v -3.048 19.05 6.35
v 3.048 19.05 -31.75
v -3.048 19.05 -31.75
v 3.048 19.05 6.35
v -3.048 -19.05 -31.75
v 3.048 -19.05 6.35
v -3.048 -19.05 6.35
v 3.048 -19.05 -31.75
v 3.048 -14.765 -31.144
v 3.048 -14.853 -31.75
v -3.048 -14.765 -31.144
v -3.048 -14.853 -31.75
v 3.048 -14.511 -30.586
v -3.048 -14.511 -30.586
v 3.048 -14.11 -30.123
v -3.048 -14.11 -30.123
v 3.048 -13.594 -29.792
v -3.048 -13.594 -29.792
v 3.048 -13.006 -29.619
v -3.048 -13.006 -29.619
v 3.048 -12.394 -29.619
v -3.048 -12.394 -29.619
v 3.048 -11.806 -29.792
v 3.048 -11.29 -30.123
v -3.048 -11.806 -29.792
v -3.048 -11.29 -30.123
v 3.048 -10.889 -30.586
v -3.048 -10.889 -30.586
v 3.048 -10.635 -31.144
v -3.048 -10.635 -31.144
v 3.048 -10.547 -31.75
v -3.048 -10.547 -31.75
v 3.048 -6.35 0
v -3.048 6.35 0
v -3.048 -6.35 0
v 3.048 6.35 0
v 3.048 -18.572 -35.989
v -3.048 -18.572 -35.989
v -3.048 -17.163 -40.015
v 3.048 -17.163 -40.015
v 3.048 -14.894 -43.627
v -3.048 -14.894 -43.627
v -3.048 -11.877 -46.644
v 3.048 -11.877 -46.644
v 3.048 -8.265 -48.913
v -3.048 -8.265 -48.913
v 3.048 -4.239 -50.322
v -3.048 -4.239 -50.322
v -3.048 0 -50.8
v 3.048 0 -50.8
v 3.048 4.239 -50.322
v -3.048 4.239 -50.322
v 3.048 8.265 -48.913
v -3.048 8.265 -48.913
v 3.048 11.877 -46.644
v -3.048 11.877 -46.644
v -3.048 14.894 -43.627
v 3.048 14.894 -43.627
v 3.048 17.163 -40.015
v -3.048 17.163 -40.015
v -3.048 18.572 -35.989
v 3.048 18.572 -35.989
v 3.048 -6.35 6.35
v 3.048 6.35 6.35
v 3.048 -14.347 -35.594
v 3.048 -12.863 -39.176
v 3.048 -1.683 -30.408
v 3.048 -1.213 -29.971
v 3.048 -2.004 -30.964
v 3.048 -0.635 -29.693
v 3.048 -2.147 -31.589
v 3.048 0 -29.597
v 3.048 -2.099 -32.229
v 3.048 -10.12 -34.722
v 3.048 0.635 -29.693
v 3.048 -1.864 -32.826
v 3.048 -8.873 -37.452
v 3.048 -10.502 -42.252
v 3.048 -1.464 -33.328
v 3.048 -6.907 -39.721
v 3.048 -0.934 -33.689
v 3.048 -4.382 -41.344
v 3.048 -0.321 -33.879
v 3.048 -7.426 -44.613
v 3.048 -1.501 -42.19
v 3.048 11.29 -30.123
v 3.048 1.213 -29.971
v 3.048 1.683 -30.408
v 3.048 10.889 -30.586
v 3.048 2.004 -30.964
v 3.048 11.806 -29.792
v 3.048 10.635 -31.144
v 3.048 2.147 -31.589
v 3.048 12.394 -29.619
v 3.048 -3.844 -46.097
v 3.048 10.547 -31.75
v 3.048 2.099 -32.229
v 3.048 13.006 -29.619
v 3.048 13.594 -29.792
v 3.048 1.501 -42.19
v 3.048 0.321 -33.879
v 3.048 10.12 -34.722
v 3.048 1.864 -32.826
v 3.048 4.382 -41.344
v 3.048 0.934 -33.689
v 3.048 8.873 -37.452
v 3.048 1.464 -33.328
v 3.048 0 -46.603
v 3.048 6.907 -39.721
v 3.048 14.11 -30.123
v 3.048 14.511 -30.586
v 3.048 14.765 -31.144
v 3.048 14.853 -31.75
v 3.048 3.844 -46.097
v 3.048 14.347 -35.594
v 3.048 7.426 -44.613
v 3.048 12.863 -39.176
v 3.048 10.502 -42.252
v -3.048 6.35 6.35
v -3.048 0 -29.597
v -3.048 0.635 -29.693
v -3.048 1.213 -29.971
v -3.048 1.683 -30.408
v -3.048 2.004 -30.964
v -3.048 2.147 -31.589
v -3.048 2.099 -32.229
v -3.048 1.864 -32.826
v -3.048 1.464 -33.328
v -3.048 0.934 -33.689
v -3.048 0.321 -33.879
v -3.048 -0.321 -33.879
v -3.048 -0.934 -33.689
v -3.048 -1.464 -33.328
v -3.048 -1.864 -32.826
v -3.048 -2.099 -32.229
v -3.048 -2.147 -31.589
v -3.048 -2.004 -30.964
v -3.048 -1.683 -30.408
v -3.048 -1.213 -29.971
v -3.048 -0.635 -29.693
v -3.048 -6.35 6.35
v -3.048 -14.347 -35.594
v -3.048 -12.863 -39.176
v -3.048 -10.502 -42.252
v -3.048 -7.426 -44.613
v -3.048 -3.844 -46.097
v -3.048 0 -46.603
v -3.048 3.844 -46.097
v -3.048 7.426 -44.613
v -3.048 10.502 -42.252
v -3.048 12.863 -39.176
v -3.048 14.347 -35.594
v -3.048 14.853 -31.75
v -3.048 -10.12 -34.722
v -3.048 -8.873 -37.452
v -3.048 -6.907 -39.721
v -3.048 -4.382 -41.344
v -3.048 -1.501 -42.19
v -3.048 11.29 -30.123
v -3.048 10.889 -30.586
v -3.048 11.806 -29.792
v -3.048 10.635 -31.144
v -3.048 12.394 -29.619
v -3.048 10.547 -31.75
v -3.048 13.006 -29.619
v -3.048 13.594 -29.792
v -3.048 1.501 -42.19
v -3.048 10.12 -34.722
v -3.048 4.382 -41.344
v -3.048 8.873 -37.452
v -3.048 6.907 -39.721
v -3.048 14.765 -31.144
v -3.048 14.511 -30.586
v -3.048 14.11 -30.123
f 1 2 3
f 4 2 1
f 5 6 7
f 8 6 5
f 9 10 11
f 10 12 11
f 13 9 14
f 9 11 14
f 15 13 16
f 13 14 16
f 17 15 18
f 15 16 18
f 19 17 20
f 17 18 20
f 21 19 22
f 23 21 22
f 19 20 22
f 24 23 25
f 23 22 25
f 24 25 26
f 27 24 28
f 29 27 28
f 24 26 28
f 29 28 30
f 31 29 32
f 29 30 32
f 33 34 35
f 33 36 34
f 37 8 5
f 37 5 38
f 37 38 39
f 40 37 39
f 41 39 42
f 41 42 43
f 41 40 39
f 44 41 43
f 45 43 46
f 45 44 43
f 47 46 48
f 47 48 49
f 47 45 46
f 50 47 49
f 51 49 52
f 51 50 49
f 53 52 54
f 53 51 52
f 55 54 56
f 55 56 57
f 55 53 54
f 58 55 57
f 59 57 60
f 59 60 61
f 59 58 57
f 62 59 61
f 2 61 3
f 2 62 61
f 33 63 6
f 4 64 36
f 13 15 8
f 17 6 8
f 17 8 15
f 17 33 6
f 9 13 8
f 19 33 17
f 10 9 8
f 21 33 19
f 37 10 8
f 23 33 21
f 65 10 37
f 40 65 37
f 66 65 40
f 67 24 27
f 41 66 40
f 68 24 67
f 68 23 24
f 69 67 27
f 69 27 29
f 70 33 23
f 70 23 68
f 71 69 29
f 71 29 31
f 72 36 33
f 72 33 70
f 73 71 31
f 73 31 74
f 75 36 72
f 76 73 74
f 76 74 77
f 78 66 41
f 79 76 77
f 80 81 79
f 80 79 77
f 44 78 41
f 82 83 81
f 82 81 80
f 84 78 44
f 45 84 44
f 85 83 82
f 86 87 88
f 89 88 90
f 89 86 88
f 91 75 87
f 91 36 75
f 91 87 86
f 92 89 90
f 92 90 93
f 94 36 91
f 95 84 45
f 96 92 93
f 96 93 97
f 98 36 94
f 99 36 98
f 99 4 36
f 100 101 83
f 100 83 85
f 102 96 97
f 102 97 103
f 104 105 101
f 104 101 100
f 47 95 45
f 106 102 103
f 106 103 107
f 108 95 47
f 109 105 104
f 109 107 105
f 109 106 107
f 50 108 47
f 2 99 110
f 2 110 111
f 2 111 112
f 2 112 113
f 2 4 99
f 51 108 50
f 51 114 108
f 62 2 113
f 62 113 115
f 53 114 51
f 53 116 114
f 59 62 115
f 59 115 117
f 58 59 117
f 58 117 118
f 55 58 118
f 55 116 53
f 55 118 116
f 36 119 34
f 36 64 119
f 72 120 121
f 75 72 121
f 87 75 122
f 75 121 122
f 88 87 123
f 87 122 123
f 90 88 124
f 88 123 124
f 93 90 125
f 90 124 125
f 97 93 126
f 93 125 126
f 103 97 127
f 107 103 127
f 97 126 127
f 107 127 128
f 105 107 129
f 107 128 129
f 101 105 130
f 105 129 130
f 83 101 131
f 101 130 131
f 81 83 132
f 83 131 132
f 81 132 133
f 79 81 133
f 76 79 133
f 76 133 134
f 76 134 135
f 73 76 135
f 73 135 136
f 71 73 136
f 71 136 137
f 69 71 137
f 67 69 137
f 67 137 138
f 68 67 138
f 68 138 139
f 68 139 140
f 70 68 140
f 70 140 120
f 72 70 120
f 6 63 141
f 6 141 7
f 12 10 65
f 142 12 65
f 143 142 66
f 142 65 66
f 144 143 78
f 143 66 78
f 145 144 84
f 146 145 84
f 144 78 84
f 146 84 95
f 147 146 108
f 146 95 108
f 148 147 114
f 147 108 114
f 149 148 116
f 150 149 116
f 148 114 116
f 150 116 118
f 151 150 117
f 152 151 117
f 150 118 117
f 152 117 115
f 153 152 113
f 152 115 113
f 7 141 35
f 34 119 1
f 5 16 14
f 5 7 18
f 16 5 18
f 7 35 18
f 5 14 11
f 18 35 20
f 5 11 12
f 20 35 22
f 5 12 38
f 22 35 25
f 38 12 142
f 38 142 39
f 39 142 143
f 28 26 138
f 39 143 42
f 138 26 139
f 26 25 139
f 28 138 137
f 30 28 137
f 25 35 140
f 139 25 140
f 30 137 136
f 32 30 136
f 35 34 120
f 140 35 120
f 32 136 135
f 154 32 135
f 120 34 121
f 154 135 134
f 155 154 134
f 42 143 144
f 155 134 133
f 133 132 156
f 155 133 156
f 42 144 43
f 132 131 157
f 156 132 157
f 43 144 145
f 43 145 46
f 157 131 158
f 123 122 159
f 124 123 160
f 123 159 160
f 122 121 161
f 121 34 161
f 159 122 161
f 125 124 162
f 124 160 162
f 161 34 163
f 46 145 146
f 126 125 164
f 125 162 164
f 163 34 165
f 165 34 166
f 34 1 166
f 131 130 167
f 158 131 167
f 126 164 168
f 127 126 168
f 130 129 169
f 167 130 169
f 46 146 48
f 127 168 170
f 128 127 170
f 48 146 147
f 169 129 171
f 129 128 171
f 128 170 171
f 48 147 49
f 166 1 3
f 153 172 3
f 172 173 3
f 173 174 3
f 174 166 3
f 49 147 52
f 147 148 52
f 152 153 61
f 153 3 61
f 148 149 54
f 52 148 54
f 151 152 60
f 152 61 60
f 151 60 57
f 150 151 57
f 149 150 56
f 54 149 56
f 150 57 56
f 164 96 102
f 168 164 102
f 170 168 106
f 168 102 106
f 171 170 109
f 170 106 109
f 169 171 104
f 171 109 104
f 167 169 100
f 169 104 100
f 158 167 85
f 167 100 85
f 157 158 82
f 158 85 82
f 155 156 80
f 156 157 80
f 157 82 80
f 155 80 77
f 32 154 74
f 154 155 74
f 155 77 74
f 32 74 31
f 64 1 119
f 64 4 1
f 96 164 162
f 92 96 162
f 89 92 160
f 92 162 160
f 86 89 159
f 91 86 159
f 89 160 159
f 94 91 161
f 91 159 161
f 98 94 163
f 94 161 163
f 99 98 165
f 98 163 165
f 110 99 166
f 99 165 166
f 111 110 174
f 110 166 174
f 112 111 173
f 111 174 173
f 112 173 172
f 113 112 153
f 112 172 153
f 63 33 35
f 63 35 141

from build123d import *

# Parameters (mm, degrees)
BOSS_EXTRUDE1_DEPTH   = 3.048
F_8_CLEARANCE_HOLE1_D = 4.3053
CUT_EXTRUDE1_DEPTH    = 55.595821415


with BuildPart() as part:
    # Sketch1 → Boss-Extrude1 (new, symmetric)
    with BuildSketch(Plane(origin=(0, 0, 0), x_dir=(0, 0, -1), z_dir=(1, 0, 0))):
        with BuildLine():
            Line((0, 6.35), (0, -6.35))
            Line((0, -6.35), (-6.35, -6.35))
            Line((-6.35, -6.35), (-6.35, -19.05))
            Line((-6.35, -19.05), (31.75, -19.05))
            ThreePointArc((31.75, -19.05), (50.8, 0), (31.75, 19.05))
            Line((31.75, 19.05), (-6.35, 19.05))
            Line((-6.35, 19.05), (-6.35, 6.35))
            Line((-6.35, 6.35), (0, 6.35))
        make_face()
    extrude(amount=BOSS_EXTRUDE1_DEPTH, both=True)

    # #8 Clearance Hole1 (through all)
    with Locations(Plane(origin=(3.048, 0, 0), x_dir=(0, 0, -1), z_dir=(1, 0, 0))):
        with Locations((31.75, 0), (31.75, 12.7), (31.75, -12.7)):
            Hole(F_8_CLEARANCE_HOLE1_D / 2)

    # Sketch5 → Cut-Extrude1 (cut, through all)
    with BuildSketch(Plane(origin=(3.048, 0, 0), x_dir=(0, 0, -1), z_dir=(1, 0, 0))):
        with BuildLine():
            ThreePointArc((33.90265, 12.7), (33.272153413, 11.177846587), (31.75, 10.54735))
            ThreePointArc((31.75, 10.54735), (42.29735, 0), (31.75, -10.54735))
            ThreePointArc((31.75, -10.54735), (33.272153413, -11.177846587), (33.90265, -12.7))
            ThreePointArc((33.90265, -12.7), (33.272153413, -14.222153413), (31.75, -14.85265))
            ThreePointArc((31.75, -14.85265), (46.60265, 0), (31.75, 14.85265))
            ThreePointArc((31.75, 14.85265), (33.272153413, 14.222153413), (33.90265, 12.7))
        make_face()
    extrude(amount=-CUT_EXTRUDE1_DEPTH, mode=Mode.SUBTRACT)


solid = part.part
